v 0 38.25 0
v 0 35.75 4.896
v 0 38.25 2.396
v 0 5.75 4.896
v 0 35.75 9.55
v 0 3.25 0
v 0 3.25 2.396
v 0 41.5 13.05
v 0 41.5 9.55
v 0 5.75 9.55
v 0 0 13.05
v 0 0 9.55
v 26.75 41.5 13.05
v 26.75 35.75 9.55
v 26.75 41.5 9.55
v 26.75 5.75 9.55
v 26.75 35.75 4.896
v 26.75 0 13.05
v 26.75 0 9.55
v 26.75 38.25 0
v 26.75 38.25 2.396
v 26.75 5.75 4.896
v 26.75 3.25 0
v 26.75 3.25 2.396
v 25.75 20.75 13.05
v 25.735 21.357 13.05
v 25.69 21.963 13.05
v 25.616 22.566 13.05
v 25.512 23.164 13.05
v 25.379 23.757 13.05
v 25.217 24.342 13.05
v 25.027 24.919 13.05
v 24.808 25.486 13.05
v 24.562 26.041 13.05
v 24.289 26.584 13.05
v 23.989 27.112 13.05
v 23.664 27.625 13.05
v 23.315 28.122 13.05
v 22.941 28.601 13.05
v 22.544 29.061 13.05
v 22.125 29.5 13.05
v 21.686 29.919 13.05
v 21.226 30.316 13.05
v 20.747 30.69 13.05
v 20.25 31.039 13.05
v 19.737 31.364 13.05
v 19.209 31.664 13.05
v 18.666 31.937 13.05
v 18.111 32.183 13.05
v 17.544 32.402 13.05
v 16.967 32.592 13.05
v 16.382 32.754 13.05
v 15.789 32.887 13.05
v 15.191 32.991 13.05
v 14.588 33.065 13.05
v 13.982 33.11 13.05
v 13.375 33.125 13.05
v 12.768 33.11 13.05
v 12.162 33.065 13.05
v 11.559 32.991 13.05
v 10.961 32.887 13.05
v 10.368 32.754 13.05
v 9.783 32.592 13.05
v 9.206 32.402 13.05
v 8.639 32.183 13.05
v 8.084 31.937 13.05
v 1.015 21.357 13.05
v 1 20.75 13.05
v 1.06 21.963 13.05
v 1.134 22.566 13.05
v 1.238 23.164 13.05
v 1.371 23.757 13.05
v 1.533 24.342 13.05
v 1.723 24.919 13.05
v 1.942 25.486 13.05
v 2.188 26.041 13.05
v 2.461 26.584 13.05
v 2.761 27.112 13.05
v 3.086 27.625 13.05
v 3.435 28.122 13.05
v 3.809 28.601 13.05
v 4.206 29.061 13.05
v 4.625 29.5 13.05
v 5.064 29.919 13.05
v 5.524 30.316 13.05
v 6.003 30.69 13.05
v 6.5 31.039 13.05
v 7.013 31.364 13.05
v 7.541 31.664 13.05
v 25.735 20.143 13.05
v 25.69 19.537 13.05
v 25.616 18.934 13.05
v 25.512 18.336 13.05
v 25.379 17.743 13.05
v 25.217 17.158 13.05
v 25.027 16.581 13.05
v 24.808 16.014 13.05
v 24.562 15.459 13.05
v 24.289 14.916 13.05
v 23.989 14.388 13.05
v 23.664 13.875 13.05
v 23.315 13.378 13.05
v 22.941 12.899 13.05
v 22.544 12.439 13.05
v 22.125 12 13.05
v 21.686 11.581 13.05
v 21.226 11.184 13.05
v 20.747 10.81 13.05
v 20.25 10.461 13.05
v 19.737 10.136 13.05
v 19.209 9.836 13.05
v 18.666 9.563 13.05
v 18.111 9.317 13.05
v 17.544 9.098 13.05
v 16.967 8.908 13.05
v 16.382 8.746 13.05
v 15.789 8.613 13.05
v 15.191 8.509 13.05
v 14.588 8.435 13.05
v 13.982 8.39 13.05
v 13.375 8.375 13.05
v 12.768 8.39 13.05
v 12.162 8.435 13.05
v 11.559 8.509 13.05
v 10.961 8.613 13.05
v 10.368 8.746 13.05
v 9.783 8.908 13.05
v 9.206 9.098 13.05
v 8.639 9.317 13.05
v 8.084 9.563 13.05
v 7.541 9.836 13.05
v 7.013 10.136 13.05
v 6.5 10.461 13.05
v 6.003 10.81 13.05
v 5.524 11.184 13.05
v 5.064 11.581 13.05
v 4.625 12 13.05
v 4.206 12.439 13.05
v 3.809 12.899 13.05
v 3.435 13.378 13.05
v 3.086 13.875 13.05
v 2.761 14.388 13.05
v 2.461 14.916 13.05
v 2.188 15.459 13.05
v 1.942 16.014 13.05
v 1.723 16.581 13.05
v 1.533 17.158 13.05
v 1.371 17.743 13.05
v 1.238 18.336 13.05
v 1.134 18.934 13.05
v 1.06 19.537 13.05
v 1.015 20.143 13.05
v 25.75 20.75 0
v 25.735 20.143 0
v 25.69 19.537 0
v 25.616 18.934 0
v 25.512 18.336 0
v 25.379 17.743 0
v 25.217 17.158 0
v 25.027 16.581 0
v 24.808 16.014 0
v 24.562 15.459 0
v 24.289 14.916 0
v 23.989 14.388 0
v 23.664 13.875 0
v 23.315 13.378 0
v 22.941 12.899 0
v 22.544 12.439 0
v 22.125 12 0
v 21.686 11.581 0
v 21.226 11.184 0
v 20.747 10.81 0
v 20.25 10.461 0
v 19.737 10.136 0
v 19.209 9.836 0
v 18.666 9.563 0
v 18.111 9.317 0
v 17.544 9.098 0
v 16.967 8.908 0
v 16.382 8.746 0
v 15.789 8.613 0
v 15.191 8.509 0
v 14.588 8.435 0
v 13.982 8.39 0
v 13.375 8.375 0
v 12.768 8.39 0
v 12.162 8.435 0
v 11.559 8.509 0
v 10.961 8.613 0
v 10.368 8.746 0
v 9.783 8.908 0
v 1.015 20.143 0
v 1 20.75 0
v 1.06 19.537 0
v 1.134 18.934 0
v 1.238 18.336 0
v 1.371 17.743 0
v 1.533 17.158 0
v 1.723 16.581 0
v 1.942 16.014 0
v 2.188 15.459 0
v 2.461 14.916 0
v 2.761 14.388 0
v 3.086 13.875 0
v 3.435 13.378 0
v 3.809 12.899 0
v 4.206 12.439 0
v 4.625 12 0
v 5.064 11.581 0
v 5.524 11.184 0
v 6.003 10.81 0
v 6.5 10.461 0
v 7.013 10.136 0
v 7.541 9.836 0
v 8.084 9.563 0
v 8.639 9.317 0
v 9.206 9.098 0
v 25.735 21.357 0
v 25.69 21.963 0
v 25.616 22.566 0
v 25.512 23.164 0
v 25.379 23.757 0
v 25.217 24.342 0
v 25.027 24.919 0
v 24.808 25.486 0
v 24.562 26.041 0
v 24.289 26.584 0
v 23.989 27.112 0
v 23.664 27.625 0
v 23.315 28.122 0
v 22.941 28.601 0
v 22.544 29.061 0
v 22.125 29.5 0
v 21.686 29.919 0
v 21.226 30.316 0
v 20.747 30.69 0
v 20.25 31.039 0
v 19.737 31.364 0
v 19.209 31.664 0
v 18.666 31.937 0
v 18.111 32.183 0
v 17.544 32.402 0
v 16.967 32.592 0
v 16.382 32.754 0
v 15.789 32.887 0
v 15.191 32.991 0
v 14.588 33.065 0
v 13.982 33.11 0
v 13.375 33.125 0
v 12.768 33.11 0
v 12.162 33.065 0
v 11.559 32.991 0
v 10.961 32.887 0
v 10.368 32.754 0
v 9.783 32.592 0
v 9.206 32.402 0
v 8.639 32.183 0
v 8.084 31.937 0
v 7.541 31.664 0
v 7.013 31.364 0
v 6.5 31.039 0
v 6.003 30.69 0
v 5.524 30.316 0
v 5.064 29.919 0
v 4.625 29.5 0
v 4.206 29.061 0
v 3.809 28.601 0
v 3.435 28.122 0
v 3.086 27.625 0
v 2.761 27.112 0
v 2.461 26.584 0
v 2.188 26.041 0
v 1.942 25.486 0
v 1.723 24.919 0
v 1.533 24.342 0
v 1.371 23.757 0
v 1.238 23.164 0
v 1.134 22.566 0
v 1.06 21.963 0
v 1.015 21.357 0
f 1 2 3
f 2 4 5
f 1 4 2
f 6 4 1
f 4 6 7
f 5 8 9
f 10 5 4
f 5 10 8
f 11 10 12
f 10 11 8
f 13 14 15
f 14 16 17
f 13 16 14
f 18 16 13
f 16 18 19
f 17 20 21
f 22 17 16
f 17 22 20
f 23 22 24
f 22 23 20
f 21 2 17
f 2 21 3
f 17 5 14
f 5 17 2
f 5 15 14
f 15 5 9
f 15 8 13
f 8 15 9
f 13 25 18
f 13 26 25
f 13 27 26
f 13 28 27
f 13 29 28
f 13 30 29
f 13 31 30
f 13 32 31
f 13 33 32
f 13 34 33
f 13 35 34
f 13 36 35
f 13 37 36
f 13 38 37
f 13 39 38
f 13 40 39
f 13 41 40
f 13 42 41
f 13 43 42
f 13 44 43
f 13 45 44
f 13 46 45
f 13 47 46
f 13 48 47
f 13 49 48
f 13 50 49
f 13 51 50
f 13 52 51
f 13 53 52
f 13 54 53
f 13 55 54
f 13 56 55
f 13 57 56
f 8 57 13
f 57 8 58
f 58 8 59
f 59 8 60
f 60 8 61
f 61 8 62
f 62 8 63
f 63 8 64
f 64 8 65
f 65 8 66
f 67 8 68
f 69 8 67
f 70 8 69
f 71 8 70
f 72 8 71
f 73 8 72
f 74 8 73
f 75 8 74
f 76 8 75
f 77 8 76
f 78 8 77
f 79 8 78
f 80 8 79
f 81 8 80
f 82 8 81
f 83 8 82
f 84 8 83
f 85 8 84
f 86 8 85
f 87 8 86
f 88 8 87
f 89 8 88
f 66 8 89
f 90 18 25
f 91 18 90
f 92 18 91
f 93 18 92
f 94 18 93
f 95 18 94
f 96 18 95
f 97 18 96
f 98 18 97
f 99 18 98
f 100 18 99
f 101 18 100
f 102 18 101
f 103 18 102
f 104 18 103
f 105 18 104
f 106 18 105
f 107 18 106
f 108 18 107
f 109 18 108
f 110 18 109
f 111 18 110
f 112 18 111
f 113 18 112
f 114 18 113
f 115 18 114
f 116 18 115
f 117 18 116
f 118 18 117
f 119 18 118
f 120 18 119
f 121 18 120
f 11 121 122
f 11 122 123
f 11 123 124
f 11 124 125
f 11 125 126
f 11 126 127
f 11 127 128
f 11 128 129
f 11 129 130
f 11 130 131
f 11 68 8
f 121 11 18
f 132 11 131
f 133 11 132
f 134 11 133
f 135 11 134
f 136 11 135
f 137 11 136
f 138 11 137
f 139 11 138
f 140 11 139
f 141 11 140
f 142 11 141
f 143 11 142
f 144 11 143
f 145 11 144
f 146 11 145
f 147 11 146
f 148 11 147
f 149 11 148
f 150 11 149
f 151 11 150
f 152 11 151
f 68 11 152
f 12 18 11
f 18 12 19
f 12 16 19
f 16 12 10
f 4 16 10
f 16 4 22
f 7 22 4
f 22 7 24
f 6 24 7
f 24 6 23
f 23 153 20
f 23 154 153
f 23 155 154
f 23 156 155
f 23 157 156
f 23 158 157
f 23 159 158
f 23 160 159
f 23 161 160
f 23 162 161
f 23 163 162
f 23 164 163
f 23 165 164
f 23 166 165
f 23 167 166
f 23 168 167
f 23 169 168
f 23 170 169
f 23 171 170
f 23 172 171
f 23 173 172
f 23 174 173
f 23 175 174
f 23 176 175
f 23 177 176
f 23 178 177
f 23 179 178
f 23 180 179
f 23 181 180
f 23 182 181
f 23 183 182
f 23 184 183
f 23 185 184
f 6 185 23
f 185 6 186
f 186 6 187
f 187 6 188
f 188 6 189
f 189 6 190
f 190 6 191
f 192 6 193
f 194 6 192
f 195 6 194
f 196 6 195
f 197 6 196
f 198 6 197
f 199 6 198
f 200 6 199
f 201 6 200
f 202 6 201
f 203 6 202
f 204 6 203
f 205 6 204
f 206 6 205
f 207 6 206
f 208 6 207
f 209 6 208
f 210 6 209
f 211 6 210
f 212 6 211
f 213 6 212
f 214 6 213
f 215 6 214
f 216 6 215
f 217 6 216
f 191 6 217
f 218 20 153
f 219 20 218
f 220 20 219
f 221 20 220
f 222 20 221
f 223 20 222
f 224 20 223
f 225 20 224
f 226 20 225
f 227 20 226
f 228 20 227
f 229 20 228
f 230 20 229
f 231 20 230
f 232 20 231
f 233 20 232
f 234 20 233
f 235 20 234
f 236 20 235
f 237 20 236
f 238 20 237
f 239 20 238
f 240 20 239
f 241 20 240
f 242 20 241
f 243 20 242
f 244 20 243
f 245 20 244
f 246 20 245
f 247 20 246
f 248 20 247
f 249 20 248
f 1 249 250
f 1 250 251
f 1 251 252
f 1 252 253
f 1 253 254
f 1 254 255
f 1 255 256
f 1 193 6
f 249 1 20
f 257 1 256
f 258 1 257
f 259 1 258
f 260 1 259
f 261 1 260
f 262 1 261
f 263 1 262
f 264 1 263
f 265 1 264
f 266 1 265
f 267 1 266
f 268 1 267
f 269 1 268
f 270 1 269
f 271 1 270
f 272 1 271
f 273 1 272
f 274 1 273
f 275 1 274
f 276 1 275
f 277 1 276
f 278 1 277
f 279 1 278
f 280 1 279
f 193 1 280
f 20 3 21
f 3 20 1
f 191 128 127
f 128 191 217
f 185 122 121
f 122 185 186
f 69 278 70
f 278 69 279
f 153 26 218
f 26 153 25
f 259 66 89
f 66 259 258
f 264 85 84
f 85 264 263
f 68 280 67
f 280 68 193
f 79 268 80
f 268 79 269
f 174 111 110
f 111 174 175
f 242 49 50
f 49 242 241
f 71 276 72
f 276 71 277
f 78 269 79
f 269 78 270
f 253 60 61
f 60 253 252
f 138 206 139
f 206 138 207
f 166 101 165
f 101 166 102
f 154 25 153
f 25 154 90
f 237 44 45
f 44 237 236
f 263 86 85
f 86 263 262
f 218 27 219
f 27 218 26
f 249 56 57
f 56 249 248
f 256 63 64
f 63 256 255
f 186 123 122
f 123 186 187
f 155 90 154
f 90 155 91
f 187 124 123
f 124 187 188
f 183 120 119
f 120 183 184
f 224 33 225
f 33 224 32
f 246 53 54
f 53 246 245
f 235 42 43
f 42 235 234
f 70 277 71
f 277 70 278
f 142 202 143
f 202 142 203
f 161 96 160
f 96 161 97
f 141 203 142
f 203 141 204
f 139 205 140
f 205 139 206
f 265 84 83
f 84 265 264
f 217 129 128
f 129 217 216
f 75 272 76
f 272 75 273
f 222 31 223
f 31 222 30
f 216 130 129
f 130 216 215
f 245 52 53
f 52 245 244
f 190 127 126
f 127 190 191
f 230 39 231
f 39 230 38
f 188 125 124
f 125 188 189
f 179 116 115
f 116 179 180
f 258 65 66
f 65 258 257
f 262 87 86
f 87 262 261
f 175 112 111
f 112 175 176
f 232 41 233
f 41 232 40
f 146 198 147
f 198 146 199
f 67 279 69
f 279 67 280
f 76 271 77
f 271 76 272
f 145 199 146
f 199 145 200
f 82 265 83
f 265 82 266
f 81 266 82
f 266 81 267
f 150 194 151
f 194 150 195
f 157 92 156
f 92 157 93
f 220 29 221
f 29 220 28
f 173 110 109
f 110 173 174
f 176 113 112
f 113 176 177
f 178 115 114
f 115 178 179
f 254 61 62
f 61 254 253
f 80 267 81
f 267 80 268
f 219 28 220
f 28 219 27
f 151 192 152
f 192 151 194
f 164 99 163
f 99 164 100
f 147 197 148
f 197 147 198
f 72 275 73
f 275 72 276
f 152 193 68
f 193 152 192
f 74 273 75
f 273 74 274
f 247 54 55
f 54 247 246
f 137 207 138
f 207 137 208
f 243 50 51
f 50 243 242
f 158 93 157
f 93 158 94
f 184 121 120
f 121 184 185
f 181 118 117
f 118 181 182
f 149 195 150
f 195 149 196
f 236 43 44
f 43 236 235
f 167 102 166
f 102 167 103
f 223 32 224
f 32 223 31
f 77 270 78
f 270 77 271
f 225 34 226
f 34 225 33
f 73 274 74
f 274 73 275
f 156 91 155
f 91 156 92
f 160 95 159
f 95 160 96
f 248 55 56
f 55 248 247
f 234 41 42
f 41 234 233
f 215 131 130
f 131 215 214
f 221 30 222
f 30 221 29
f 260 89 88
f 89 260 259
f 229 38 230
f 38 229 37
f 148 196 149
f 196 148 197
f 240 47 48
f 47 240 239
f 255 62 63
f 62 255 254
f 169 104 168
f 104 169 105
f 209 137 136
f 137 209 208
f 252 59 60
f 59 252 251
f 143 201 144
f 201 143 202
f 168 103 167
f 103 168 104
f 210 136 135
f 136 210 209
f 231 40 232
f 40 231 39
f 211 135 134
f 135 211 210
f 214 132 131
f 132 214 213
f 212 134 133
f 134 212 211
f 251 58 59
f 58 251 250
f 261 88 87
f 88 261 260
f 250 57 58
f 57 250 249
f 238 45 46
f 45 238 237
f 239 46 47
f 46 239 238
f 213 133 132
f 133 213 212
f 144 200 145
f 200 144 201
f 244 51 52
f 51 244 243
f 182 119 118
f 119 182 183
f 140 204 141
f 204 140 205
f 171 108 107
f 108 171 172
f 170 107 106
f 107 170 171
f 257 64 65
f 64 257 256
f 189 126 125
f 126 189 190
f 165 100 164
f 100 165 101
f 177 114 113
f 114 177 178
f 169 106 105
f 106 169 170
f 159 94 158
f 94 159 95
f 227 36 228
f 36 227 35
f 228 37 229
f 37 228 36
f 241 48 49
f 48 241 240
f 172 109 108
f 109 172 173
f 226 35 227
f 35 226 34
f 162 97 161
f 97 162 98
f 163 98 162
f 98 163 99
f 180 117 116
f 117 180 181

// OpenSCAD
socketDiameter = 24; // This should be the only param required
holeDiameter = socketDiameter + .75; // accounting for smooth clearance
sliderWidth = holeDiameter + 2 ;  // thickness (extrusion depth)

assert(socketDiameter > 0, "socketDiameter must be > 0");
assert(socketDiameter <= 28, "socketDiamter must be less than or equal to 28");

// label parameters, user EITHER labelNumerator/Denominator OR labelMetric
labelPosition = "bottomMid";
labelNumerator = undef; // expected parameter (required for imperial)
labelDenominator = undef; // expected parameter (required for imperial)
labelMetric = 13; // expected parameter (required for metric)

// Label positions supported: topLeft, bottomLeft

function isLabelMetric() = 
    !is_undef(labelMetric);
 
function isLabelImperial() =
    !is_undef(labelNumerator) &&
    !is_undef(labelDenominator);

assert(
    isLabelMetric() || isLabelImperial(), "Missing parameters: EITHER labelMetric OR labelNumerator and labelDenominator must be provided");
assert(
    !(isLabelMetric() && isLabelImperial()), "Extra parameters: label parameters for both metric and imperial labels has been provided. EITHER labelMetric OR labelNumerator and labelDenominator must be provided");
    
labelFile = isLabelMetric() ? str(labelMetric, "mm_bold.dxf") : str(labelNumerator, "_over_", labelDenominator, "_bold.dxf"); 


// shape controls
H = 13.05;
topL = 41.5;
bottomL = 35;
topLipH  = 3.5;
botLipH = 2.396;
diagHeight  = 4.896;
neckHalf = 15;
diagRun  = 2.5;

$fn = 128;

// Hole position in the cross-section (YZ plane)
hole_y = H + 1;
hole_z = sliderWidth/2;     

hole_len = topL;

module silhouette_2d() {
  cx = topL/2;
  bottomTrim = (topL - bottomL)/2;
  polygon(points=[
    [0, H],
    [topL, H],

    [topL, H - topLipH],
    [cx + neckHalf, H - topLipH],

    [cx + neckHalf, diagHeight],

    [cx + neckHalf + diagRun, botLipH],
    [ topL - bottomTrim, 0],
    [0, 0],

    [bottomTrim, 0],
    [bottomTrim, botLipH],
    [cx - neckHalf, diagHeight],

    [cx - neckHalf, H - topLipH],
    [0, H - topLipH]
  ]);
}

module body() {
  linear_extrude(height=sliderWidth)
    silhouette_2d();
}

module hole_through_length() {
  // Cylinder default axis is Z. Rotate so axis becomes X.
  // Then place it so it starts at the chosen end.
  x0 = holeDiameter>neckHalf*2 ? 20.75 : holeDiameter/2 + 6.5
    ;

  translate([topL/2, hole_y, hole_z])
    rotate([90, 90, 0])
      cylinder(h=hole_len, d=holeDiameter, center=false);
}

module model() {
  // cut hole through model
  difference() {
    body();
    hole_through_length();
  }
}

// Make Y become Z (so "height" is up)
rotate([90, 0, 90])
    model();


labelPath = str("./labels/", labelFile);
labelXOffset = isLabelMetric() ? len(str(labelMetric)) * 2.6 : len(str(labelNumerator)) + len(str(labelDenominator)) + 1.2;
labelYOffset = isLabelMetric() ? 8 : 5;

scaleFactor = isLabelMetric() ? .8 : .5;


if (labelPosition == "topLeft") {
translate([1, topL - labelYOffset, H])
    linear_extrude(height=.6)
        scale(scaleFactor)
            import(labelPath);
}
if (labelPosition == "bottomLeft") {
translate([0, 0, H])
    linear_extrude(height=.6)
        scale(scaleFactor)
            import(labelPath);
}
